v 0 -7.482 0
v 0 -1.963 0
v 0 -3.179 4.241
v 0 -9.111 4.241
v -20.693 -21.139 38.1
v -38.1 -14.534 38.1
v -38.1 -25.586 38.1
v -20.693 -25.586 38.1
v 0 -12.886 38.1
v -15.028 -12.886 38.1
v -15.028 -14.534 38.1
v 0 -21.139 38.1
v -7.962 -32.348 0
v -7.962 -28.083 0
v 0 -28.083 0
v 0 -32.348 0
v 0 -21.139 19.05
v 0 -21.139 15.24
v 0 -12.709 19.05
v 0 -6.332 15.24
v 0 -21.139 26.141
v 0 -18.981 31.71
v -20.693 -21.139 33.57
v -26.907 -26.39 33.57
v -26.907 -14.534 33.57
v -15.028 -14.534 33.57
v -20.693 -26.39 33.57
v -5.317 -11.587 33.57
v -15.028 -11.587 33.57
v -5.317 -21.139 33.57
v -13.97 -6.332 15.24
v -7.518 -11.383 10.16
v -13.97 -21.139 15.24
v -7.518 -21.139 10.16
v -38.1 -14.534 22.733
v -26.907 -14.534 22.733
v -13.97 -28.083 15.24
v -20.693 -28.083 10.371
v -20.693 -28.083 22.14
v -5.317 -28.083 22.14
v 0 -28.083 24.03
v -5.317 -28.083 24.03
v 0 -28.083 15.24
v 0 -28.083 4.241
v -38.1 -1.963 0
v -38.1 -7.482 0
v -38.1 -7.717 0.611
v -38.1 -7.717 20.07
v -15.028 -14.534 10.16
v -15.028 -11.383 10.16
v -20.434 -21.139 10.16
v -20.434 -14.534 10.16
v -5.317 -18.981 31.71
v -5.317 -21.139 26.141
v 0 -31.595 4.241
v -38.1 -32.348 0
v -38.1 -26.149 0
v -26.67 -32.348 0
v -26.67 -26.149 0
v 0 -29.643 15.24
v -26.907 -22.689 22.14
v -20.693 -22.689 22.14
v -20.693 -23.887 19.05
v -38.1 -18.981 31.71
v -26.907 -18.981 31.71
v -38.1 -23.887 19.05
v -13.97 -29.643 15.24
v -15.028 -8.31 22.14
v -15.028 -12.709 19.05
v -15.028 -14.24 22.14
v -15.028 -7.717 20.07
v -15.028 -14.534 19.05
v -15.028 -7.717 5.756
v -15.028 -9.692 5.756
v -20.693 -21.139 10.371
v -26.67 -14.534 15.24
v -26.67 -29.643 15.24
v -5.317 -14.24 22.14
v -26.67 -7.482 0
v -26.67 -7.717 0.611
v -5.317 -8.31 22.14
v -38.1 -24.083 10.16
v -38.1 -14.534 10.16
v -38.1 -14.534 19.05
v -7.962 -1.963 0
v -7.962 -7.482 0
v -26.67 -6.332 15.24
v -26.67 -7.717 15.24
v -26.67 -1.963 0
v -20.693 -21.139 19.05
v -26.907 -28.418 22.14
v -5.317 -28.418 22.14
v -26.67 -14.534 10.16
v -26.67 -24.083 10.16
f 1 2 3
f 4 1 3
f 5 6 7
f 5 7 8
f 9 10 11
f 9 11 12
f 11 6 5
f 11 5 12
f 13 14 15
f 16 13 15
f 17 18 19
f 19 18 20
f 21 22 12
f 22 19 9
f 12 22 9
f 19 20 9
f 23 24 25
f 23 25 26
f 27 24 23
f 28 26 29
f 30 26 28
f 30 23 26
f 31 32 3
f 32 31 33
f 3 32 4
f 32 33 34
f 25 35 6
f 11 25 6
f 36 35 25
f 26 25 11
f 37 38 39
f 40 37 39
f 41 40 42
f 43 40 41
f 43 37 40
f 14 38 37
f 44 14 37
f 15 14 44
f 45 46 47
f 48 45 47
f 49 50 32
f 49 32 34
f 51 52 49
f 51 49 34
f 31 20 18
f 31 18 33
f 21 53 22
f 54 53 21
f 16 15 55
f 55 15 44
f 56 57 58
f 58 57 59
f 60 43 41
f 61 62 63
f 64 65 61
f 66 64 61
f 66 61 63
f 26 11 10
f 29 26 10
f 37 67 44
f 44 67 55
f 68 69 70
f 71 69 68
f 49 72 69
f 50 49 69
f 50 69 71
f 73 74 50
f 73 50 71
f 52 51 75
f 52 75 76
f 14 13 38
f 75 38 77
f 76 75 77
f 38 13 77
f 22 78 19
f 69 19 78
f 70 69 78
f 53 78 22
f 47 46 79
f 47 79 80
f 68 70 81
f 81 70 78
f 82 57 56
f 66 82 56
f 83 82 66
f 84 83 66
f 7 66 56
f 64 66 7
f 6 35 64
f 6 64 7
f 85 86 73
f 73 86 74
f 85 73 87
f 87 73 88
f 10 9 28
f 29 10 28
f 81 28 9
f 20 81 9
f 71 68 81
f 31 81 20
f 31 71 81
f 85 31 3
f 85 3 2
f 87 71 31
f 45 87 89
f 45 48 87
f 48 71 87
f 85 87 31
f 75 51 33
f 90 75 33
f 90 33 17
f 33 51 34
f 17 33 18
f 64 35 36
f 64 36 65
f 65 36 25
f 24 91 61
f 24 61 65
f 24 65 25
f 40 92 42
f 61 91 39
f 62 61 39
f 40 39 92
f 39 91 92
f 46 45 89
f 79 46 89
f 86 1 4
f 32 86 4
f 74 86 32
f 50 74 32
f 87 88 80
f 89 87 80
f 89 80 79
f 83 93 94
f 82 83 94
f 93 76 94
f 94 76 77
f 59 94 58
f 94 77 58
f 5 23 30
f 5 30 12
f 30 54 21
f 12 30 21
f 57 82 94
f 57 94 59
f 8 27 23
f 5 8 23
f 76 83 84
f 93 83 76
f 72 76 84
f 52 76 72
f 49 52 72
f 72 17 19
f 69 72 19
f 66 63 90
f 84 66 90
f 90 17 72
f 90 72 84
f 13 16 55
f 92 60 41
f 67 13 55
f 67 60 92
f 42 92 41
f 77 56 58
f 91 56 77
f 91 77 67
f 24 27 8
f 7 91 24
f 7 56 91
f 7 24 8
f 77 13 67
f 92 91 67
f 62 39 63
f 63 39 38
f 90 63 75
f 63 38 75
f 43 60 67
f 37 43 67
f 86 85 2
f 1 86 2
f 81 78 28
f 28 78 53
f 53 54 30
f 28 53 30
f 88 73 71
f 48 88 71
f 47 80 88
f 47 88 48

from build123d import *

# Parameters (mm, degrees)
F0_W     = 38.1
F0_H     = 38.1
F1_DEPTH = 38.1
F4_W     = 21.59
F4_H     = 11.43
F5_DEPTH = 38.1
F7_DEPTH = 38.1
F8_W     = 20.69306
F8_H     = 6.94398
F9_DEPTH = 38.1


with BuildPart() as f1:
    # F0 (on Front) → F1 (new body)
    with BuildSketch(Plane.XZ):
        with Locations((-19.05, 19.05)):
            Rectangle(F0_W, F0_H)
    extrude(amount=F1_DEPTH)

    # F4 (on offset) → F5 (cut)
    with BuildSketch(Plane.XZ.offset(38.1)):
        with Locations((-16.112197, 27.854883)):
            Rectangle(F4_W, F4_H)
        Polygon((-26.67, 15.24), (-26.67, 0), (-16.748283, 0), (-12.880538, 0), (-7.961732, 0), align=None)
        Polygon((0, 4.241477), (0, 15.24), (-13.97, 15.24), align=None)
    extrude(amount=-F5_DEPTH, mode=Mode.SUBTRACT)

    # F6 (on offset) → F7 (cut)
    with BuildSketch(Plane.YZ.offset(-38.1)):
        Polygon((0, 38.1), (-12.885808, 38.1), (-1.962553, 0), (0, 0), align=None)
        Polygon((-18.980795, 31.710041), (-23.886719, 19.05), (-12.708837, 19.05), align=None)
        Polygon((-25.585808, 38.1), (-38.1, 38.1), (-38.1, 0), (-32.347631, 0), align=None)
        Polygon((-24.083182, 10.16), (-26.149293, 0), (-13.001305, 0), (-7.481929, 0), (-11.383182, 10.16), align=None)
    extrude(amount=F7_DEPTH, mode=Mode.SUBTRACT)

    # F8 (on Top) → F9 (cut)
    with BuildSketch(Plane.XY):
        Polygon((-15.027703, -7.71672), (-38.1, -7.71672), (-38.1, -12.706961), (-38.1, -14.533657), (-15.027703, -14.533657), align=None)
        with Locations((-10.34653, -24.610928)):
            Rectangle(F8_W, F8_H)
    extrude(amount=F9_DEPTH, mode=Mode.SUBTRACT)


solid = f1.part
